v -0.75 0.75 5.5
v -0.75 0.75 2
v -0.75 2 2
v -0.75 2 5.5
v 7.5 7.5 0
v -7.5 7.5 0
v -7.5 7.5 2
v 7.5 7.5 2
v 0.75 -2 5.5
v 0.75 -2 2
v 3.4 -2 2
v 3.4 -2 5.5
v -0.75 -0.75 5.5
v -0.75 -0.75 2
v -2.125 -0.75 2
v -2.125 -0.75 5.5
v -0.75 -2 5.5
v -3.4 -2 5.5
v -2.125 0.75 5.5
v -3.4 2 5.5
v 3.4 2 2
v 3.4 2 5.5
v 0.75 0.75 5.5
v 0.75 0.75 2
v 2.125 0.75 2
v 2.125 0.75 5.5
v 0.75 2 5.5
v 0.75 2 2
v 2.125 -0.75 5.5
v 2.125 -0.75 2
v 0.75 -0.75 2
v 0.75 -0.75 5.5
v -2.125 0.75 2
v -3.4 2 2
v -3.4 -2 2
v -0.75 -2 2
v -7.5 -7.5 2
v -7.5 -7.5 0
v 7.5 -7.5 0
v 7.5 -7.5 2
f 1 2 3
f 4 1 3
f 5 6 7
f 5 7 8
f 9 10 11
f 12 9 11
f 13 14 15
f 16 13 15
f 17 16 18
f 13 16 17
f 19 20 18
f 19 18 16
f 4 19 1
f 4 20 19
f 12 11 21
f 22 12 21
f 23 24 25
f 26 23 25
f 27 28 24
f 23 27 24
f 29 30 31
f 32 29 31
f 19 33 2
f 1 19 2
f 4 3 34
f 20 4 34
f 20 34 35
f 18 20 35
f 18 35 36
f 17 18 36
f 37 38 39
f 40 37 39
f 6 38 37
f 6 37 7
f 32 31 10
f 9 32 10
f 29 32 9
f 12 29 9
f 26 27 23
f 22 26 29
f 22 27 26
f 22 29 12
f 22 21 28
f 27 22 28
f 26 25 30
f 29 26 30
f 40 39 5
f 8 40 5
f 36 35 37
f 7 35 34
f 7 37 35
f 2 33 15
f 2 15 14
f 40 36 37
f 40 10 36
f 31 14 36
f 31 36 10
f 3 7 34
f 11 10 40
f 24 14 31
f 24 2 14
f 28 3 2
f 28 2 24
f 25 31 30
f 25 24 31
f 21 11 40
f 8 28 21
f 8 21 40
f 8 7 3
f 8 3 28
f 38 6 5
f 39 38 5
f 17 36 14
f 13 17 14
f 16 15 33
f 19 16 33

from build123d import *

# Parameters (mm, degrees)
F0_W     = 15
F0_H     = 15
F1_DEPTH = 2
F3_DEPTH = 3.5


with BuildPart() as f1:
    # F0 (on Top) → F1 (new body)
    with BuildSketch(Plane.XY):
        Rectangle(F0_W, F0_H)
    extrude(amount=F1_DEPTH)

    # F2 (on face) → F3 (join)
    with BuildSketch(Plane.XY.offset(2)):
        Polygon((-3.4, -2), (-0.75, -2), (-0.75, -0.75), (-2.125, -0.75), (-2.125, 0.75), (-0.75, 0.75), (-0.75, 2), (-3.4, 2), align=None)
        Polygon((0.75, -2), (3.4, -2), (3.4, 2), (0.75, 2), (0.75, 0.75), (2.125, 0.75), (2.125, -0.75), (0.75, -0.75), align=None)
    extrude(amount=F3_DEPTH)


solid = f1.part
